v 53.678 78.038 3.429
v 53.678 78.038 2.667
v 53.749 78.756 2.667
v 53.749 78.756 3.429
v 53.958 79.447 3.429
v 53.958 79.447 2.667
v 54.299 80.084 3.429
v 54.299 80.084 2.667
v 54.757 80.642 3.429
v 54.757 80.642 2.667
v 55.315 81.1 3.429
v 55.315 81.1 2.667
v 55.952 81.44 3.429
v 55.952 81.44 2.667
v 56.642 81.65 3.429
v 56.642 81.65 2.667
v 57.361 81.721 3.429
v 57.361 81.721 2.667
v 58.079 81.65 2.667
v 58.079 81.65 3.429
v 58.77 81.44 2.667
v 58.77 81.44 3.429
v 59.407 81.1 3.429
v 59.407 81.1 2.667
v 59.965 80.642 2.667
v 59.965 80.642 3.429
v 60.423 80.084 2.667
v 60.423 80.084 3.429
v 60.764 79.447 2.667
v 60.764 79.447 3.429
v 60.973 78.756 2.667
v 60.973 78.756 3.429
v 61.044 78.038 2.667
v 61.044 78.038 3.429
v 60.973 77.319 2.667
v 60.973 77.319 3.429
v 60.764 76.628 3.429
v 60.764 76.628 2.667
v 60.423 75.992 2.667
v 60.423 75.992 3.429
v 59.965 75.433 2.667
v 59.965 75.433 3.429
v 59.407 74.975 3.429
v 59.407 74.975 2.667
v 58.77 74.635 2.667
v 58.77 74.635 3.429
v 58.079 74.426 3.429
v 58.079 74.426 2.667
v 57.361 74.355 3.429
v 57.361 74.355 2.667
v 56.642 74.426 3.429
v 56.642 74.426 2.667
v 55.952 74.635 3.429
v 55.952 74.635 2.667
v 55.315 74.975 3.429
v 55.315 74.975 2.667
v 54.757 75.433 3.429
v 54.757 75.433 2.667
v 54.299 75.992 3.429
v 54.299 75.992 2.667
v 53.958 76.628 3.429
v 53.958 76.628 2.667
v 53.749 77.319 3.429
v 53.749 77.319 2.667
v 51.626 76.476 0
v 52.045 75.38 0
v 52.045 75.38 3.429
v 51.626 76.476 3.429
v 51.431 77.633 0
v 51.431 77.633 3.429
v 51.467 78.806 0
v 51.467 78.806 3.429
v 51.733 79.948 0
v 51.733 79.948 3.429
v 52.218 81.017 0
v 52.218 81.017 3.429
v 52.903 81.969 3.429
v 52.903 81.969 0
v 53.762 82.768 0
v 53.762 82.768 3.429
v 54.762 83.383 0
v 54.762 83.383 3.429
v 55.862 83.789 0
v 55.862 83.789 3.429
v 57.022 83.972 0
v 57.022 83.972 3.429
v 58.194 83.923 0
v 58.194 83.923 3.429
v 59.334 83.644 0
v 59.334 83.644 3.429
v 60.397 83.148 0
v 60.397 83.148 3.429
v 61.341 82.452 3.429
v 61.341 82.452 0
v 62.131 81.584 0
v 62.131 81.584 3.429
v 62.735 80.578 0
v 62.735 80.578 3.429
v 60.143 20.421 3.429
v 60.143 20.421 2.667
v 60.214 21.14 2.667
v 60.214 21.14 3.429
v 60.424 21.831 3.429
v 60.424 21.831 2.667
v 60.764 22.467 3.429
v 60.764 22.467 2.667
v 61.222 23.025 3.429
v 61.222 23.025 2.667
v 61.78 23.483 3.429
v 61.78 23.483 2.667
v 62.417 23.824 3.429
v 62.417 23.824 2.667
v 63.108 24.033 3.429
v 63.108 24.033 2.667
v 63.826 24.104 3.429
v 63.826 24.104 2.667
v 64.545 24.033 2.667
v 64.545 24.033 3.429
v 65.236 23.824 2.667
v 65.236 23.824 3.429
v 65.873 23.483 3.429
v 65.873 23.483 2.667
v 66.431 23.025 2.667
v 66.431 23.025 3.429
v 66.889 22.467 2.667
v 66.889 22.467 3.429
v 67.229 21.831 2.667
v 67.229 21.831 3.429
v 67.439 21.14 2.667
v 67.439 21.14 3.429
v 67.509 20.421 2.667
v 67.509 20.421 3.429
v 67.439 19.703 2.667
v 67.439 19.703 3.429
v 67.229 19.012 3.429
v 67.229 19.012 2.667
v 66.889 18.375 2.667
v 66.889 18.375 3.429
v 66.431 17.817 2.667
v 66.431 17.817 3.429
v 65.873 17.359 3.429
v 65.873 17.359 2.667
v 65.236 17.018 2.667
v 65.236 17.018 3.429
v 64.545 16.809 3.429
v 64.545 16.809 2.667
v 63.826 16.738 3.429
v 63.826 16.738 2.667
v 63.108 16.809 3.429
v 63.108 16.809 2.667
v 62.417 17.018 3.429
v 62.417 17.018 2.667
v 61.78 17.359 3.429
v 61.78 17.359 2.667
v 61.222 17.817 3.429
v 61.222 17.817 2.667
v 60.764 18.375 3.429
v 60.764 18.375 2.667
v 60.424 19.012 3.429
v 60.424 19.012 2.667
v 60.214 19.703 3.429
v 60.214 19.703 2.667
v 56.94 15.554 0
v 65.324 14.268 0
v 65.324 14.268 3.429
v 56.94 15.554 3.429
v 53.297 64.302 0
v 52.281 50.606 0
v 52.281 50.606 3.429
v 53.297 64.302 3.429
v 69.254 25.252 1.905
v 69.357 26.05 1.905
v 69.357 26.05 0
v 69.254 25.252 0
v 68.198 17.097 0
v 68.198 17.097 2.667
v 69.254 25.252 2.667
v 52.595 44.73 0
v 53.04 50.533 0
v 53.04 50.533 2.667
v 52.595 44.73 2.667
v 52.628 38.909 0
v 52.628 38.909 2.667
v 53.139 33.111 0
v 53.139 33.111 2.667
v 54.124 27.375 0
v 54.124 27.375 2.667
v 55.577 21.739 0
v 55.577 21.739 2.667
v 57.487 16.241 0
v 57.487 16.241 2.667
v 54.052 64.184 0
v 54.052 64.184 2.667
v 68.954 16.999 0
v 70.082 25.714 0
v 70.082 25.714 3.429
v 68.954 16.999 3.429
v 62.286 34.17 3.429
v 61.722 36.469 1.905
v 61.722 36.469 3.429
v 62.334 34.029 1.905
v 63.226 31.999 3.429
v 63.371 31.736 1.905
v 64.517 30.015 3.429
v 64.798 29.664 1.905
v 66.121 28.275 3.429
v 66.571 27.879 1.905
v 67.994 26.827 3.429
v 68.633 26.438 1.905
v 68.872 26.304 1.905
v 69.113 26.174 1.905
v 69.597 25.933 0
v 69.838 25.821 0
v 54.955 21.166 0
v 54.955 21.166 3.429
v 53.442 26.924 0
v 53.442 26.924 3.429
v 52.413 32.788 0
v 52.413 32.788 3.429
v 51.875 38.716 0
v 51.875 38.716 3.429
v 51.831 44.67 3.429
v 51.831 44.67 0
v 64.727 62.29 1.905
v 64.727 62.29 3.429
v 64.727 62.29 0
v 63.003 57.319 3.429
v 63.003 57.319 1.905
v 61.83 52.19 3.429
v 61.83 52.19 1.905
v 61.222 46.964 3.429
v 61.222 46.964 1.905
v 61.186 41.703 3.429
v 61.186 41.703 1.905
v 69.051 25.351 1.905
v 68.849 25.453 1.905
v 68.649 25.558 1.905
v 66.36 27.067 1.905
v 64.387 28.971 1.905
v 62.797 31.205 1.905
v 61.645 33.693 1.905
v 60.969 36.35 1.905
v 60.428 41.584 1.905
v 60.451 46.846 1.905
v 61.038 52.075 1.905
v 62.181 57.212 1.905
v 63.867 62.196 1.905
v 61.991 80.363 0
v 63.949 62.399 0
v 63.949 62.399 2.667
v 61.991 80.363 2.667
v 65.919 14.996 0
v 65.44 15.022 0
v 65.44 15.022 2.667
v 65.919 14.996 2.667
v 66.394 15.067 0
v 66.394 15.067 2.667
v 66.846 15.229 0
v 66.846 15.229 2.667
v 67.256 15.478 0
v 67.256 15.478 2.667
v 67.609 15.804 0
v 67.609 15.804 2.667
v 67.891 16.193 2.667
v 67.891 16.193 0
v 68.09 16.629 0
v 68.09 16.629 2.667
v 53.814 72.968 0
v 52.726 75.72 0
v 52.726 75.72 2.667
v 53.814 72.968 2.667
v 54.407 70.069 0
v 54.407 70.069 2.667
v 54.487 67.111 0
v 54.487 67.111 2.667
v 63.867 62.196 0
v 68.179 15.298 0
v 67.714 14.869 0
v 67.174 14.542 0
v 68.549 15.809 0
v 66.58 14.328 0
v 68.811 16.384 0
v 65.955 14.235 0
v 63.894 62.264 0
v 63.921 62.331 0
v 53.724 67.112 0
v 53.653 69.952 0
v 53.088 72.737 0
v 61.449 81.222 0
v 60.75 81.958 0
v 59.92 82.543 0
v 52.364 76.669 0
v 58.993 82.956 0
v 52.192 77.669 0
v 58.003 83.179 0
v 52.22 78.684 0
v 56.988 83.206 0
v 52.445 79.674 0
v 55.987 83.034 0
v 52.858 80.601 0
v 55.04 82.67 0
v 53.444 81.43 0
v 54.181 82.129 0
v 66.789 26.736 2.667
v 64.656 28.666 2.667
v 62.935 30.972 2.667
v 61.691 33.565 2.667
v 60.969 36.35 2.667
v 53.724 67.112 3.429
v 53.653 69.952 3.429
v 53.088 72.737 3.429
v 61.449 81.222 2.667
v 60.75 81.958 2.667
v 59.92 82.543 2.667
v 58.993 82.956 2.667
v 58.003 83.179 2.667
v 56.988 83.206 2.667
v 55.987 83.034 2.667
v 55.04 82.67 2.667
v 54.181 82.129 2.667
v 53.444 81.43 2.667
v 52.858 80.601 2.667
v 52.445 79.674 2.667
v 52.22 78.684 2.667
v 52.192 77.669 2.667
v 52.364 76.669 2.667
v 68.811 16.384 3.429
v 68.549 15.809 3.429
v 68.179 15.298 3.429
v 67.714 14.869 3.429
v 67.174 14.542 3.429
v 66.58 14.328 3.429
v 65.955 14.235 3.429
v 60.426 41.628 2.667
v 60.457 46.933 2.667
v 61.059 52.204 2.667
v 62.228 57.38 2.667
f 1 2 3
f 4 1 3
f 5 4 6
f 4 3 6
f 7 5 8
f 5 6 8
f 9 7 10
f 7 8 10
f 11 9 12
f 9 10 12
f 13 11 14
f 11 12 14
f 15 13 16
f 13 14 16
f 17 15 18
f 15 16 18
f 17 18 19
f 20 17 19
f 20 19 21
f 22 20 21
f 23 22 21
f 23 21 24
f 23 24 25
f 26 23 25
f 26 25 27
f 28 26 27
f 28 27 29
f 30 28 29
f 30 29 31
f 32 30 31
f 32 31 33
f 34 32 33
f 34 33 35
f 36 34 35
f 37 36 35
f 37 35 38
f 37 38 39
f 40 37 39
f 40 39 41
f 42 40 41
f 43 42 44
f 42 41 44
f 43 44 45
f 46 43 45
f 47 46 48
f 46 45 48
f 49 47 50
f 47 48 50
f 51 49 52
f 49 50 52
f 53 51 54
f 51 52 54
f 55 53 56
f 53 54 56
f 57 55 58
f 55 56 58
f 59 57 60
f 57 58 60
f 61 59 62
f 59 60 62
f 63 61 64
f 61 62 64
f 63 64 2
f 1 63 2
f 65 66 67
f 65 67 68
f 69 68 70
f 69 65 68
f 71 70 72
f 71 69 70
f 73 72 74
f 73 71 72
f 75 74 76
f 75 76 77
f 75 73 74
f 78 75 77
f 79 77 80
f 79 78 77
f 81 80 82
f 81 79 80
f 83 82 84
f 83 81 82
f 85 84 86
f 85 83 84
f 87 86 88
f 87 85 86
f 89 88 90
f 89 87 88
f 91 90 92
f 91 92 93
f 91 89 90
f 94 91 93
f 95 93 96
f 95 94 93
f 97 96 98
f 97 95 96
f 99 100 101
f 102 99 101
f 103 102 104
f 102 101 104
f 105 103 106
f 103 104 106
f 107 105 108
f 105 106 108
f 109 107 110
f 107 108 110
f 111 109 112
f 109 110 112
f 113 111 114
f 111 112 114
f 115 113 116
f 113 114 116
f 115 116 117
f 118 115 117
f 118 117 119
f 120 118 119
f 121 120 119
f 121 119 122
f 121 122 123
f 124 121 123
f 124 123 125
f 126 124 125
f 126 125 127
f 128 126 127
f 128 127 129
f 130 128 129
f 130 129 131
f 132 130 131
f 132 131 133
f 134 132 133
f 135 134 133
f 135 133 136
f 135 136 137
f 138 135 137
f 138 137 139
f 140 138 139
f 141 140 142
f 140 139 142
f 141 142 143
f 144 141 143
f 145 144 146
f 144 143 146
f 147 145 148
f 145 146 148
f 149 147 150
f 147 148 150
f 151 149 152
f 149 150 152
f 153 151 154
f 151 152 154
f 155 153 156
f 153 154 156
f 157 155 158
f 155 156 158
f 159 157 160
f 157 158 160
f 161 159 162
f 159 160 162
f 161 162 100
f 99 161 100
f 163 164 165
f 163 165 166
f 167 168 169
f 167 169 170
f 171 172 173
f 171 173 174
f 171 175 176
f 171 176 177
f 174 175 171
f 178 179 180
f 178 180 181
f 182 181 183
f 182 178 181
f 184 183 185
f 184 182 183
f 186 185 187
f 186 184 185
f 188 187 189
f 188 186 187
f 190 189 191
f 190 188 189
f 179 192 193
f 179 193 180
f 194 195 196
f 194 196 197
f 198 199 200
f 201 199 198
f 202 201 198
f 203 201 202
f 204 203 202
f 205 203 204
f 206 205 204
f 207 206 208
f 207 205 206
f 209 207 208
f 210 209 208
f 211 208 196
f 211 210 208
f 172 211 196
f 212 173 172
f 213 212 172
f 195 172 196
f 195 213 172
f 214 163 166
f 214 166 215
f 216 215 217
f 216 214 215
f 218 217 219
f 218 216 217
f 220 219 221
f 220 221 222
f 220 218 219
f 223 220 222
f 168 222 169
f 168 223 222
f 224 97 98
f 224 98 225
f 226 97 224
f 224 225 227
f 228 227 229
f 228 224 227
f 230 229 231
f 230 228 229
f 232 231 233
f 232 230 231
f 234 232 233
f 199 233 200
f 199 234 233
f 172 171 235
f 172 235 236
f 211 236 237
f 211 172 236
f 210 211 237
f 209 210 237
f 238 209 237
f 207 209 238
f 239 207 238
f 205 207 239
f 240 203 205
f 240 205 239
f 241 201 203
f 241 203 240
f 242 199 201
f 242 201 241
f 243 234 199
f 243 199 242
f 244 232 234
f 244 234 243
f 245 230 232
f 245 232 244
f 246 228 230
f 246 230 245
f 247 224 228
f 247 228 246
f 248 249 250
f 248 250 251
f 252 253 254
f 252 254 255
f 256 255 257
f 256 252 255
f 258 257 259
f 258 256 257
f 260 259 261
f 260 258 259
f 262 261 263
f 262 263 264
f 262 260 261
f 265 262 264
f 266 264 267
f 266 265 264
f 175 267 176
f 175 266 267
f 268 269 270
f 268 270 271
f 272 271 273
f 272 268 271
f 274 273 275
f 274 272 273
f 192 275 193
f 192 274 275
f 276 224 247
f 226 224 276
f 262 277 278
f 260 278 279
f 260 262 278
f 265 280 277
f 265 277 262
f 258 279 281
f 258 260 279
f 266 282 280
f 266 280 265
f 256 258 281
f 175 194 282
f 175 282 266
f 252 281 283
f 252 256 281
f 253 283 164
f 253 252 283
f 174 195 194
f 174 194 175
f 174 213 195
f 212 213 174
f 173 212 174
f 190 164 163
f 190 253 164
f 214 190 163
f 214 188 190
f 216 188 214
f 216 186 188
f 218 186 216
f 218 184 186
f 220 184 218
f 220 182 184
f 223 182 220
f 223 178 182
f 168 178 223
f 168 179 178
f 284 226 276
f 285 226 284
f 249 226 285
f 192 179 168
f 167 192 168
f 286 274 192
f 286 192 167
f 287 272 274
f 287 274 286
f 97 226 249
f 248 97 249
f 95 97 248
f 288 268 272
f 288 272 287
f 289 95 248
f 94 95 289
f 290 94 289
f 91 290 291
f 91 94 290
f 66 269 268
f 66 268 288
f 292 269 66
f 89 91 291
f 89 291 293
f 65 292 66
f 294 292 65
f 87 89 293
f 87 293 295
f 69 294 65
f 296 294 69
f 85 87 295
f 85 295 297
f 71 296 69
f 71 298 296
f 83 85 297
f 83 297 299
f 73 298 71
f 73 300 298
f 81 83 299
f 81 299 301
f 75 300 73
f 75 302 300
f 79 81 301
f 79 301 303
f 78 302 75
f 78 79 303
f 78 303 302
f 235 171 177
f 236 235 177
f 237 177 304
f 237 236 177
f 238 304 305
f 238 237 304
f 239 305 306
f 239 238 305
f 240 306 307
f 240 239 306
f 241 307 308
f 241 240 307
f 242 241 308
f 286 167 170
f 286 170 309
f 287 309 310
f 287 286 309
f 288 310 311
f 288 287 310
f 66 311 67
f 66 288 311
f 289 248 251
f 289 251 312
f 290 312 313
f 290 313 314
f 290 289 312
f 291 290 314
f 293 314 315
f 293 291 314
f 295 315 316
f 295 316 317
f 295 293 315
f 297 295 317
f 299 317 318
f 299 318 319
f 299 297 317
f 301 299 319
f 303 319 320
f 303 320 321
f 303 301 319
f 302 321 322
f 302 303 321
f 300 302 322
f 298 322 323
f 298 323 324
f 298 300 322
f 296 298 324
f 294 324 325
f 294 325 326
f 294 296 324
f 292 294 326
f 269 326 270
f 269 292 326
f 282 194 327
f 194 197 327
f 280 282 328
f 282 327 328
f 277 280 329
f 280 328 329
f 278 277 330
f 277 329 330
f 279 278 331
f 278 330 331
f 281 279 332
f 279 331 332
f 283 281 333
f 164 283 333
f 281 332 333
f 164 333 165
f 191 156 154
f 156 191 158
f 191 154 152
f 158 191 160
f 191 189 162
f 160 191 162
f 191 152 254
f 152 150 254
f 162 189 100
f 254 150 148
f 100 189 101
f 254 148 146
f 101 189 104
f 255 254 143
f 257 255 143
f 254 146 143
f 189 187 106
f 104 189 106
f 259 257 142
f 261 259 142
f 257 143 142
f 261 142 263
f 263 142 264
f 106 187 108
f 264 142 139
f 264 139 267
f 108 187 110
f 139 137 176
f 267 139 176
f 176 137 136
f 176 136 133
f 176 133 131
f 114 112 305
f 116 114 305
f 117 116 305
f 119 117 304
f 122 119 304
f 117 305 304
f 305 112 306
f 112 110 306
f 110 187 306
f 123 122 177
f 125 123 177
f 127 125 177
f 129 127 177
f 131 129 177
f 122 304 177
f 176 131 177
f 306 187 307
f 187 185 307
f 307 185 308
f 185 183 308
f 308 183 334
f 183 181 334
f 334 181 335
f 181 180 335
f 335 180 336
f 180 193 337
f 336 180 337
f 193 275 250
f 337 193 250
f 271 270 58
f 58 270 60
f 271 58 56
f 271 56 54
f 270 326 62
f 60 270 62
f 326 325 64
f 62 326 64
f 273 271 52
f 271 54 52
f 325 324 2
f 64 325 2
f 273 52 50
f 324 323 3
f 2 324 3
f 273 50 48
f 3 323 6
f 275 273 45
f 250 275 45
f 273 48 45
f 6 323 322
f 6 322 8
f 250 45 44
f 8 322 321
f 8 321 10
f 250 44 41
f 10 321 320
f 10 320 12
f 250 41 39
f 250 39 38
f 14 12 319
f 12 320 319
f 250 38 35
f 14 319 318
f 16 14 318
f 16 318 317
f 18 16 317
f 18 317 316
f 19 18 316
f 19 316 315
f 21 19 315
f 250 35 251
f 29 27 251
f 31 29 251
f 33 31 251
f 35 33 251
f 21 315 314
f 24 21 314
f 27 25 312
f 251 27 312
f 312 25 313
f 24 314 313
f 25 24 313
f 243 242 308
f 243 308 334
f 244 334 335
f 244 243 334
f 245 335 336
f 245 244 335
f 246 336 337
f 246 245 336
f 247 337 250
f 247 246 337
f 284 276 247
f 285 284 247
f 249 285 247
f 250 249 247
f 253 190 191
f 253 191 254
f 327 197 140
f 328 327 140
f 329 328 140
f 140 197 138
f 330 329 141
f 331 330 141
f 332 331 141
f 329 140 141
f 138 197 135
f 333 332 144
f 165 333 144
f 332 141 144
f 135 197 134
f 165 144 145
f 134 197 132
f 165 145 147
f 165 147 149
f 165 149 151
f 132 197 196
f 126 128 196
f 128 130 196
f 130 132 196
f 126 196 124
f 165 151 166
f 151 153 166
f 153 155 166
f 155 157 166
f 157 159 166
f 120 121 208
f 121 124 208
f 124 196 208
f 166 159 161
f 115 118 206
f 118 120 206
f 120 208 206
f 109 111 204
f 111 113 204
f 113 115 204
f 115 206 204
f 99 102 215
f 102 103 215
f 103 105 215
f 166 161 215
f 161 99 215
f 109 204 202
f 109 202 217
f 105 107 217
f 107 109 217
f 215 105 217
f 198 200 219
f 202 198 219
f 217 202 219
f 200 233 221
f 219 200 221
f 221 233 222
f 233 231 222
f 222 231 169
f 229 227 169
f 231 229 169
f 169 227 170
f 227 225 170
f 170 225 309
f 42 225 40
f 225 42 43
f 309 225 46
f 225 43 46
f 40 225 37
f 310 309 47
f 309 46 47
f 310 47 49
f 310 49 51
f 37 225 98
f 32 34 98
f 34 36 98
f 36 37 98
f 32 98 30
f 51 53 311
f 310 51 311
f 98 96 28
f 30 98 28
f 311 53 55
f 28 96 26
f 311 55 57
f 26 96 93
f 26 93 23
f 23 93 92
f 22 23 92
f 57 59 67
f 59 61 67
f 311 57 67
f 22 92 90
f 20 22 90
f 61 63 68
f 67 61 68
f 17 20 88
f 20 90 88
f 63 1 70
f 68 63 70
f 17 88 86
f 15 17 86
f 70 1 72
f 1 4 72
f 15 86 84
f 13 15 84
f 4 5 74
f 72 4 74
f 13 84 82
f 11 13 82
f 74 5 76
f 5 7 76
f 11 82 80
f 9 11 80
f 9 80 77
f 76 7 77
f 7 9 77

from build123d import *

# Parameters (mm, degrees)
BOSS_EXTRUDE1_DEPTH     = 3.429
FILLET1_R               = 3.175
SKETCH2_R               = 2.921
CUT_EXTRUDE1_DEPTH      = 110.435380853
SHELL2_OUTLINE_R        = 3.683
SHELL2_DEPTH            = 2.667
CUT_EXTRUDE2_REACH      = 111.435
SKETCH3_R               = 3.683
CUT_EXTRUDE3_REACH      = 80.749
SKETCH4_W               = 1.905
SKETCH4_H               = 36.940823868
CUT_EXTRUDE4_DEPTH      = 110.435380853
CUT_EXTRUDE4_DEPTH_BACK = 1.778
CUT_EXTRUDE5_DEPTH      = 0.127


# Read off the part's stored shape, not the designer's step: Shell2
with BuildPart() as part:
    # Sketch1 → Boss-Extrude1 (new body)
    with BuildSketch(Plane.XY):
        with BuildLine():
            Line((62.7345016, 80.577747087), (64.726975666, 62.289747087))
            ThreePointArc((64.726975666, 62.289747087), (61.454694837, 49.585208184), (61.721936912, 36.468740968))
            ThreePointArc((61.721936912, 36.468740968), (64.516939118, 30.014666788), (70.081936923, 25.713747087))
            Line((70.081936923, 25.713747087), (68.536975666, 13.775747087))
            Line((68.536975666, 13.775747087), (56.940284848, 15.553747087))
            ThreePointArc((56.940284848, 15.553747087), (52.413143628, 32.787644792), (52.280975666, 50.605747087))
            Line((52.280975666, 50.605747087), (53.296975666, 64.302418224))
            ThreePointArc((53.296975666, 64.302418224), (53.653310061, 69.952097941), (52.044858214, 75.37968836))
            ThreePointArc((52.044858214, 75.37968836), (54.7617878, 83.382894736), (62.7345016, 80.577747087))
        make_face()
    extrude(amount=BOSS_EXTRUDE1_DEPTH)

    # Fillet1
    fillet1_edges = [part.edges().sort_by_distance(p)[0] for p in [
        (68.536975666, 13.775747087, 1.7145),
    ]]
    fillet(fillet1_edges, radius=FILLET1_R)

    # Sketch2 → Cut-Extrude1 (cut, through all)
    with BuildSketch(Plane.XY.offset(3.429)):
        with Locations((57.360975666, 78.037747087)):
            Circle(SKETCH2_R)
        with Locations((63.826413409, 20.421081821)):
            Circle(SKETCH2_R)
    extrude(amount=-CUT_EXTRUDE1_DEPTH, mode=Mode.SUBTRACT)

    # Shell2 outline → Shell2 (cut)
    with BuildSketch(Plane.XY):
        with BuildLine():
            ThreePointArc((61.991345759, 80.363397827), (55.039508366, 82.670215989), (52.726411733, 75.72046512))
            ThreePointArc((52.726411733, 75.72046512), (54.406890906, 70.069245661), (54.052294982, 64.184132803))
            Line((54.052294982, 64.184132803), (53.039664753, 50.532889471))
            ThreePointArc((53.039664753, 50.532889471), (53.139176681, 33.111364087), (57.487066991, 16.240818773))
            Line((57.487066991, 16.240818773), (65.439706148, 15.021523317))
            ThreePointArc((65.439706148, 15.021523317), (67.256047768, 15.478396864), (68.198436672, 17.096955938))
            Line((68.198436672, 17.096955938), (69.253887741, 25.252483979))
            ThreePointArc((69.253887741, 25.252483979), (63.739946861, 29.77722029), (60.969261533, 36.349897487))
            ThreePointArc((60.969261533, 36.349897487), (60.686685648, 49.576935849), (63.948610548, 62.398567528))
            Line((63.948610548, 62.398567528), (61.991345759, 80.363397827))
        make_face()
        with Locations((63.826413409, 20.421081821)):
            Circle(SHELL2_OUTLINE_R, mode=Mode.SUBTRACT)
        with Locations((57.360975666, 78.037747087)):
            Circle(SHELL2_OUTLINE_R, mode=Mode.SUBTRACT)
    extrude(amount=SHELL2_DEPTH, mode=Mode.SUBTRACT)

    # Sketch3 → Cut-Extrude2 (cut, up to next)
    with BuildSketch(Plane(origin=(0, 0, 0), x_dir=(-1, 0, 0), z_dir=(0, 0, -1)), mode=Mode.PRIVATE) as cut_extrude2_sk1:
        with Locations((-57.360975666, 78.037747087)):
            Circle(SKETCH3_R)
    cut_extrude2_tool1 = extrude(cut_extrude2_sk1.sketch, amount=-CUT_EXTRUDE2_REACH, mode=Mode.PRIVATE) & part.part
    # Sketch3 → Cut-Extrude2 (cut, up to next)
    with BuildSketch(Plane(origin=(0, 0, 0), x_dir=(-1, 0, 0), z_dir=(0, 0, -1)), mode=Mode.PRIVATE) as cut_extrude2_sk2:
        with Locations((-63.826413409, 20.421081821)):
            Circle(SKETCH3_R)
    cut_extrude2_tool2 = extrude(cut_extrude2_sk2.sketch, amount=-CUT_EXTRUDE2_REACH, mode=Mode.PRIVATE) & part.part
    add(cut_extrude2_tool1.solids().sort_by_distance((57.360976, 78.037747, 0))[0], mode=Mode.SUBTRACT)
    add(cut_extrude2_tool2.solids().sort_by_distance((63.826413, 20.421082, 0))[0], mode=Mode.SUBTRACT)

    # Sketch4 → Cut-Extrude3 (cut, up to next)
    with BuildSketch(Plane(origin=(70.674520745, 7.699975379, 0), x_dir=(0, 0, -1), z_dir=(0.9941172894005426, 0.10830888659255154, 0)), mode=Mode.PRIVATE) as cut_extrude3_sk1:
        with Locations((-0.9525, 36.44239593)):
            Rectangle(SKETCH4_W, SKETCH4_H)
    cut_extrude3_tool1 = extrude(cut_extrude3_sk1.sketch, amount=-CUT_EXTRUDE3_REACH, mode=Mode.PRIVATE) & part.part
    add(cut_extrude3_tool1.solids().sort_by_distance((66.727485, 43.927991, 0.9525))[0], mode=Mode.SUBTRACT)

    # Sketch5 → Cut-Extrude4 (cut, two sides: drawn at the far end of the back side and taken through both)
    with BuildSketch(Plane(origin=(0, 0, 0), x_dir=(-1, 0, 0), z_dir=(0, 0, -1)).offset(-CUT_EXTRUDE4_DEPTH_BACK)):
        with BuildLine():
            Line((-69.357085228, 26.049896593), (-69.253887741, 25.252483979))
            ThreePointArc((-69.253887741, 25.252483979), (-68.949955482, 25.401641313), (-68.649499804, 25.557683339))
            Line((-68.649499804, 25.557683339), (-68.727995169, 25.566235394))
            Line((-68.727995169, 25.566235394), (-68.633052886, 26.437666796))
            ThreePointArc((-68.633052886, 26.437666796), (-68.992244892, 26.238508503), (-69.357085228, 26.049896593))
        make_face()
    extrude(amount=CUT_EXTRUDE4_DEPTH + CUT_EXTRUDE4_DEPTH_BACK, mode=Mode.SUBTRACT)

    # Sketch6 → Cut-Extrude5 (cut)
    with BuildSketch(Plane(origin=(0, 0, 1.778), x_dir=(-1, 0, 0), z_dir=(0, 0, -1))):
        with BuildLine():
            Line((-69.357085228, 26.049896593), (-69.253887741, 25.252483979))
            ThreePointArc((-69.253887741, 25.252483979), (-68.949955482, 25.401641313), (-68.649499804, 25.557683339))
            Line((-68.649499804, 25.557683339), (-68.727995169, 25.566235394))
            Line((-68.727995169, 25.566235394), (-68.633052886, 26.437666796))
            ThreePointArc((-68.633052886, 26.437666796), (-68.992244892, 26.238508503), (-69.357085228, 26.049896593))
        make_face()
    extrude(amount=-CUT_EXTRUDE5_DEPTH, mode=Mode.SUBTRACT)


solid = part.part
